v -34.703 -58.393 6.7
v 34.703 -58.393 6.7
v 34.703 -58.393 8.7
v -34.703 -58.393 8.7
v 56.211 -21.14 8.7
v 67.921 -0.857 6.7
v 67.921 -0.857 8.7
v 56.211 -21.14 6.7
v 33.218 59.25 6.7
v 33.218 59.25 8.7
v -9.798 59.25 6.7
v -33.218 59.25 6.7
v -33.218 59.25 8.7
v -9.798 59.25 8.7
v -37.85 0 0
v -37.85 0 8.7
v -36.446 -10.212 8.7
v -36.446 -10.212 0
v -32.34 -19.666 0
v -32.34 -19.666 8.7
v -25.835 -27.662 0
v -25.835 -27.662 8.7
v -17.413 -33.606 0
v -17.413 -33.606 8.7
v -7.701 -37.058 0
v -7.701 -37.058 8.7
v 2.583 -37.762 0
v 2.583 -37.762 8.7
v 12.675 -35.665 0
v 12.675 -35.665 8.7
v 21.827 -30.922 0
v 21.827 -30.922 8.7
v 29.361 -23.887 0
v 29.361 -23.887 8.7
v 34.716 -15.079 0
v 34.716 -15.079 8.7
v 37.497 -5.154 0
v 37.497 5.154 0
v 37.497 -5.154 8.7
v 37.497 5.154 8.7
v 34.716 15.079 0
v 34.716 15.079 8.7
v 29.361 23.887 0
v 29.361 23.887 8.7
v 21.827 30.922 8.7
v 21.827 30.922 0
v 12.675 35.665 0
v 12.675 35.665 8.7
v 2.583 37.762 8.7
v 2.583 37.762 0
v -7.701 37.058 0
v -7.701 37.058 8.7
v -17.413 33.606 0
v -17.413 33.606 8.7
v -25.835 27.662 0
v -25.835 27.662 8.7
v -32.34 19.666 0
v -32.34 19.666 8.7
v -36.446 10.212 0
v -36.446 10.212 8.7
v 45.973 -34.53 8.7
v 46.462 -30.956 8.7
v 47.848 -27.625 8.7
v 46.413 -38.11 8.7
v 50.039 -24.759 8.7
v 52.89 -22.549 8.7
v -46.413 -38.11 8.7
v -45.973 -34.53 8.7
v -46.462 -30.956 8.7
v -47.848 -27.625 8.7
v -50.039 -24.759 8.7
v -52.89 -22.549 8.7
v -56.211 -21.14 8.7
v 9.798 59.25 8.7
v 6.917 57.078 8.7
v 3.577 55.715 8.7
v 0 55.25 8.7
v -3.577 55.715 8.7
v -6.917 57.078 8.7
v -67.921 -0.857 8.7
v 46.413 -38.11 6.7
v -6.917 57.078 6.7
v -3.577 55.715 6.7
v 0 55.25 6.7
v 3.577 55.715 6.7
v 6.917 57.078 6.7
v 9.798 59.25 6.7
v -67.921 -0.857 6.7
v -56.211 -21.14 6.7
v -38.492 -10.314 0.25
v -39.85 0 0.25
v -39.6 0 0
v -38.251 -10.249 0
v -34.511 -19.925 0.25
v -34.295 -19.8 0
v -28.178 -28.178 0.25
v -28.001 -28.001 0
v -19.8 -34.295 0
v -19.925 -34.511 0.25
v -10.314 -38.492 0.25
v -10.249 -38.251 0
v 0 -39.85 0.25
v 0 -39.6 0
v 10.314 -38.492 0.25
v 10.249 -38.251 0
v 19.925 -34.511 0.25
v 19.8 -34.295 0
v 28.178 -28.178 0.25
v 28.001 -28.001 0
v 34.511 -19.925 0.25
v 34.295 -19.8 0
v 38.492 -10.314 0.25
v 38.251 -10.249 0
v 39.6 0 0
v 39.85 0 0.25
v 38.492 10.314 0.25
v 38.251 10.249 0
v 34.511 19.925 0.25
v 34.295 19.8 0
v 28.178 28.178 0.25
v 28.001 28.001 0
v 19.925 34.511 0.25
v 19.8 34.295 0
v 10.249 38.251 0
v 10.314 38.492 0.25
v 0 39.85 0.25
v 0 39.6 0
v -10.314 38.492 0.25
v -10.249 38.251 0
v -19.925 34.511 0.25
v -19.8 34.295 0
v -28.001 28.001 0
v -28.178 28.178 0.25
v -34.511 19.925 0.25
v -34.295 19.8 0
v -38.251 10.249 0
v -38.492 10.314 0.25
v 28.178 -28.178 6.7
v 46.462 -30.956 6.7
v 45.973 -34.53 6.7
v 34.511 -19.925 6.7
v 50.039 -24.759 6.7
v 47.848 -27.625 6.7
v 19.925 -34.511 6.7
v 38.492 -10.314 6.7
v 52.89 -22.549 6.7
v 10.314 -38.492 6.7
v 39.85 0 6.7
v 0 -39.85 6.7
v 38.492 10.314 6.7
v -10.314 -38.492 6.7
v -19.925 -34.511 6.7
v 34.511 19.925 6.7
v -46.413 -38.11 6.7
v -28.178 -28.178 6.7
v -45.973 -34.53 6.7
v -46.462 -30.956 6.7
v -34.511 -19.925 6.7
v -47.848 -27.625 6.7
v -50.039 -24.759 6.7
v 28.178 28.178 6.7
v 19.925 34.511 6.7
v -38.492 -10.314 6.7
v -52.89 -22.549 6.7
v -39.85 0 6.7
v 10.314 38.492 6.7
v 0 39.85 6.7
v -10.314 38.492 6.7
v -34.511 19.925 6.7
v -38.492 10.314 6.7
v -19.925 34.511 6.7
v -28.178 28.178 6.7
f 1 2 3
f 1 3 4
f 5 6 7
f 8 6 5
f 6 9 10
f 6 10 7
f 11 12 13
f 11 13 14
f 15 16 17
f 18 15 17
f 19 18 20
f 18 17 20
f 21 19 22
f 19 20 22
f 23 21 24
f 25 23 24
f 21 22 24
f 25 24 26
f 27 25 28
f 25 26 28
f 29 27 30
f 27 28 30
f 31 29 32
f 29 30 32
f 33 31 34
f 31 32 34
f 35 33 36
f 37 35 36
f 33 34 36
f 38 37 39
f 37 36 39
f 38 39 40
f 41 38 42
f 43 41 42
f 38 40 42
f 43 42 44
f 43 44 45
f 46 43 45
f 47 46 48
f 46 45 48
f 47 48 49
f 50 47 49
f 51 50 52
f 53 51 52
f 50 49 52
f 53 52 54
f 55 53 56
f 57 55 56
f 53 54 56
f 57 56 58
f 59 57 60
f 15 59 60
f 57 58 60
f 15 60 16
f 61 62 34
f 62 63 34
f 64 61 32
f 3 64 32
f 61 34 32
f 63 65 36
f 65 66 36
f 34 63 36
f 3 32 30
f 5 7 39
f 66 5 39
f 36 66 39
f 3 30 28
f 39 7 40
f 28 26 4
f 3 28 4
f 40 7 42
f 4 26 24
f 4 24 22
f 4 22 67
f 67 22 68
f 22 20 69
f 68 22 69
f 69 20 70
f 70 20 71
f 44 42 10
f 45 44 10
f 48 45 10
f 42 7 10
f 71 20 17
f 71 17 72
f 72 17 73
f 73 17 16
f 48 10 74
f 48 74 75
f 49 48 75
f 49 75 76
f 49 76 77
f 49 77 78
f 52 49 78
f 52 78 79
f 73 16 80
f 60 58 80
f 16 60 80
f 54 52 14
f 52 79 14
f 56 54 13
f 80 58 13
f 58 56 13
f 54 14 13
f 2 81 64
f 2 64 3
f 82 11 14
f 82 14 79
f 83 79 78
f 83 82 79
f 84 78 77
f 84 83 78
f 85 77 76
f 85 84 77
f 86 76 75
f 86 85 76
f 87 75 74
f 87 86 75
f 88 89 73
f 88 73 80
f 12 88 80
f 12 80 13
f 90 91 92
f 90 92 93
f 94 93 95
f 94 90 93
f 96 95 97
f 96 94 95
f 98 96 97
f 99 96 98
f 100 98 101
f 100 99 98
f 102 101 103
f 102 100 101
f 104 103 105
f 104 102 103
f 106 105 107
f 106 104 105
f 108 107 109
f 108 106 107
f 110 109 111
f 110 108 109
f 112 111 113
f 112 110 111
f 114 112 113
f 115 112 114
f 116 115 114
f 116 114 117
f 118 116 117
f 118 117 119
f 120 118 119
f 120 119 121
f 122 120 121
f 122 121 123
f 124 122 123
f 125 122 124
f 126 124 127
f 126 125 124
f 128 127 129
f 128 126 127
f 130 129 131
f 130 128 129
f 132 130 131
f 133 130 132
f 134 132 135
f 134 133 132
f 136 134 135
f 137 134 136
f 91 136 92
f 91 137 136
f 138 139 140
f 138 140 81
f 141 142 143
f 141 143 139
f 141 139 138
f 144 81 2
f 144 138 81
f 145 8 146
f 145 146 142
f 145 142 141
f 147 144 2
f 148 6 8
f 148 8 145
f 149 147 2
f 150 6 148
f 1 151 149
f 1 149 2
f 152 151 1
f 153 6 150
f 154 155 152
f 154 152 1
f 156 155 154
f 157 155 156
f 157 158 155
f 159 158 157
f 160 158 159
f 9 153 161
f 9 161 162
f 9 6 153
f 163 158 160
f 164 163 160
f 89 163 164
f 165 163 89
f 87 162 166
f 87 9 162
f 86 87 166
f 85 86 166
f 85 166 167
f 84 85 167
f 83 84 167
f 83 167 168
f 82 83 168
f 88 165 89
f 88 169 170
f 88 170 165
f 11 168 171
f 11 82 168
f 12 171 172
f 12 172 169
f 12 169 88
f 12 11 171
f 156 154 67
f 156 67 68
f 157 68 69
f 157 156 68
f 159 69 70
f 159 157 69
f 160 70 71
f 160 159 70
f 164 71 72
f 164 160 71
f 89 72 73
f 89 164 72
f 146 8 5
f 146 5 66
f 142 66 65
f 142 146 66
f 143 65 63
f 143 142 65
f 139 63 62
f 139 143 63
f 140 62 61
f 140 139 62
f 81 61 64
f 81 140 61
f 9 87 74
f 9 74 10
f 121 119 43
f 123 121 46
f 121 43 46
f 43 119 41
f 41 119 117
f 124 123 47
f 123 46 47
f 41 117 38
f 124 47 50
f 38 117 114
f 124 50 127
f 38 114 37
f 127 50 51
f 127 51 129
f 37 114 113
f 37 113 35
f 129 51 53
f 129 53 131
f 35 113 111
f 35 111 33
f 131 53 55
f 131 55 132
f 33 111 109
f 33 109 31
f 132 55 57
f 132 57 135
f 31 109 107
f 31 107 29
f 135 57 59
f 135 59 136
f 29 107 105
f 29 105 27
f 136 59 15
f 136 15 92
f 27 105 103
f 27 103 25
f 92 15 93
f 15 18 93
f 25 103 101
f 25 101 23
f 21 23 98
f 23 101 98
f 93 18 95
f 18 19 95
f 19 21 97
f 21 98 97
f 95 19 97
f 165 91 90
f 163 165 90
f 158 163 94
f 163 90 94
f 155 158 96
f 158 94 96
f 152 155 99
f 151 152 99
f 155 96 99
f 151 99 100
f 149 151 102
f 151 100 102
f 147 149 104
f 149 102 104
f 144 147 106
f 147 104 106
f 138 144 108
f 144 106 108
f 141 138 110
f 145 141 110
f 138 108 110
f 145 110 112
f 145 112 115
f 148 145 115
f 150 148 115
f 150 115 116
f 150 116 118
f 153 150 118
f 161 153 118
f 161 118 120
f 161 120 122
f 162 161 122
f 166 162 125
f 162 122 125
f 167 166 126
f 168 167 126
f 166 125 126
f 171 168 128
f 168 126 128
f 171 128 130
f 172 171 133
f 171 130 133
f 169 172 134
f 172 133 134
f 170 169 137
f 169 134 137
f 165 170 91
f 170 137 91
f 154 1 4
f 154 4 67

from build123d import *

# Parameters (mm, degrees)
CHAMFER1_SIZE           = 0.25
BOSS_EXTRUDE1_START     = -2
SKETCH2_R               = 44.5
BOSS_EXTRUDE1_DEPTH     = 2
CUT_EXTRUDE3_DEPTH      = 93.051684706
CUT_EXTRUDE3_DEPTH_BACK = 93.051684706
SKETCH4_W               = 115.72626858
SKETCH4_H               = 18.336467462
CHAMFER2_SIZE           = 0.25


with BuildPart() as part:
    # Sketch1 → Revolve1 (revolve)
    with BuildSketch(Plane(origin=(0, 0, 0), x_dir=(1, 0, 0), z_dir=(0, 1, 0)), mode=Mode.PRIVATE) as revolve1_sk:
        Polygon((37.85, 0), (37.85, -18.7), (44.5, -18.7), (44.5, -16.2), (43.5, -16.2), (43.5, -11.2), (44.5, -11.2), (44.5, -8.7), (55.25, -8.7), (55.25, -6.7), (39.85, -6.7), (39.85, 0), align=None)
    revolve(revolve1_sk.sketch.rotate(Axis((0, 0, -73.981367368), (0, 0, 1)), 180), axis=Axis((0, 0, -73.981367368), (0, 0, 1)))

    # Chamfer1
    chamfer1_edges = [part.edges().sort_by_distance(p)[0] for p in [
        (44.5, 0, 11.2),
        (43.5, 0, 11.2),
        (43.5, 0, 16.2),
        (44.5, 0, 16.2),
    ]]
    chamfer(chamfer1_edges, length=CHAMFER1_SIZE)

    # Sketch2 → Boss-Extrude1 (add)
    with BuildSketch(Plane.XY.offset(8.7).offset(BOSS_EXTRUDE1_START)):
        with BuildLine():
            Line((9.797958971, 59.25), (33.217958971, 59.25))
            Line((33.217958971, 59.25), (67.92098466, -0.857403669))
            Line((67.92098466, -0.857403669), (56.21098466, -21.139718626))
            ThreePointArc((56.21098466, -21.139718626), (47.847903559, -27.625), (46.413025689, -38.110281374))
            Line((46.413025689, -38.110281374), (34.703025689, -58.392596331))
            Line((34.703025689, -58.392596331), (-34.703025689, -58.392596331))
            Line((-34.703025689, -58.392596331), (-46.413025689, -38.110281374))
            ThreePointArc((-46.413025689, -38.110281374), (-47.847903559, -27.625), (-56.21098466, -21.139718626))
            Line((-56.21098466, -21.139718626), (-67.92098466, -0.857403669))
            Line((-67.92098466, -0.857403669), (-33.217958971, 59.25))
            Line((-33.217958971, 59.25), (-9.797958971, 59.25))
            ThreePointArc((-9.797958971, 59.25), (0, 55.25), (9.797958971, 59.25))
        make_face()
        with Locations(Location((0, 0, 0), (0, 0, 180))):
            Circle(SKETCH2_R, mode=Mode.SUBTRACT)
    extrude(amount=BOSS_EXTRUDE1_DEPTH)

    # Sketch4 → Cut-Extrude3 (cut, two sides: drawn at the far end of the back side and taken through both)
    with BuildSketch(Plane(origin=(0, 0, 0), x_dir=(1, 0, 0), z_dir=(0, 1, 0)).offset(-CUT_EXTRUDE3_DEPTH_BACK)):
        with Locations((0.509486717, -17.868233731)):
            Rectangle(SKETCH4_W, SKETCH4_H)
    extrude(amount=CUT_EXTRUDE3_DEPTH + CUT_EXTRUDE3_DEPTH_BACK, mode=Mode.SUBTRACT)

    # Chamfer2
    chamfer2_edges = [part.edges().sort_by_distance(p)[0] for p in [
        (39.85, 0, 0),
    ]]
    chamfer(chamfer2_edges, length=CHAMFER2_SIZE)


solid = part.part
